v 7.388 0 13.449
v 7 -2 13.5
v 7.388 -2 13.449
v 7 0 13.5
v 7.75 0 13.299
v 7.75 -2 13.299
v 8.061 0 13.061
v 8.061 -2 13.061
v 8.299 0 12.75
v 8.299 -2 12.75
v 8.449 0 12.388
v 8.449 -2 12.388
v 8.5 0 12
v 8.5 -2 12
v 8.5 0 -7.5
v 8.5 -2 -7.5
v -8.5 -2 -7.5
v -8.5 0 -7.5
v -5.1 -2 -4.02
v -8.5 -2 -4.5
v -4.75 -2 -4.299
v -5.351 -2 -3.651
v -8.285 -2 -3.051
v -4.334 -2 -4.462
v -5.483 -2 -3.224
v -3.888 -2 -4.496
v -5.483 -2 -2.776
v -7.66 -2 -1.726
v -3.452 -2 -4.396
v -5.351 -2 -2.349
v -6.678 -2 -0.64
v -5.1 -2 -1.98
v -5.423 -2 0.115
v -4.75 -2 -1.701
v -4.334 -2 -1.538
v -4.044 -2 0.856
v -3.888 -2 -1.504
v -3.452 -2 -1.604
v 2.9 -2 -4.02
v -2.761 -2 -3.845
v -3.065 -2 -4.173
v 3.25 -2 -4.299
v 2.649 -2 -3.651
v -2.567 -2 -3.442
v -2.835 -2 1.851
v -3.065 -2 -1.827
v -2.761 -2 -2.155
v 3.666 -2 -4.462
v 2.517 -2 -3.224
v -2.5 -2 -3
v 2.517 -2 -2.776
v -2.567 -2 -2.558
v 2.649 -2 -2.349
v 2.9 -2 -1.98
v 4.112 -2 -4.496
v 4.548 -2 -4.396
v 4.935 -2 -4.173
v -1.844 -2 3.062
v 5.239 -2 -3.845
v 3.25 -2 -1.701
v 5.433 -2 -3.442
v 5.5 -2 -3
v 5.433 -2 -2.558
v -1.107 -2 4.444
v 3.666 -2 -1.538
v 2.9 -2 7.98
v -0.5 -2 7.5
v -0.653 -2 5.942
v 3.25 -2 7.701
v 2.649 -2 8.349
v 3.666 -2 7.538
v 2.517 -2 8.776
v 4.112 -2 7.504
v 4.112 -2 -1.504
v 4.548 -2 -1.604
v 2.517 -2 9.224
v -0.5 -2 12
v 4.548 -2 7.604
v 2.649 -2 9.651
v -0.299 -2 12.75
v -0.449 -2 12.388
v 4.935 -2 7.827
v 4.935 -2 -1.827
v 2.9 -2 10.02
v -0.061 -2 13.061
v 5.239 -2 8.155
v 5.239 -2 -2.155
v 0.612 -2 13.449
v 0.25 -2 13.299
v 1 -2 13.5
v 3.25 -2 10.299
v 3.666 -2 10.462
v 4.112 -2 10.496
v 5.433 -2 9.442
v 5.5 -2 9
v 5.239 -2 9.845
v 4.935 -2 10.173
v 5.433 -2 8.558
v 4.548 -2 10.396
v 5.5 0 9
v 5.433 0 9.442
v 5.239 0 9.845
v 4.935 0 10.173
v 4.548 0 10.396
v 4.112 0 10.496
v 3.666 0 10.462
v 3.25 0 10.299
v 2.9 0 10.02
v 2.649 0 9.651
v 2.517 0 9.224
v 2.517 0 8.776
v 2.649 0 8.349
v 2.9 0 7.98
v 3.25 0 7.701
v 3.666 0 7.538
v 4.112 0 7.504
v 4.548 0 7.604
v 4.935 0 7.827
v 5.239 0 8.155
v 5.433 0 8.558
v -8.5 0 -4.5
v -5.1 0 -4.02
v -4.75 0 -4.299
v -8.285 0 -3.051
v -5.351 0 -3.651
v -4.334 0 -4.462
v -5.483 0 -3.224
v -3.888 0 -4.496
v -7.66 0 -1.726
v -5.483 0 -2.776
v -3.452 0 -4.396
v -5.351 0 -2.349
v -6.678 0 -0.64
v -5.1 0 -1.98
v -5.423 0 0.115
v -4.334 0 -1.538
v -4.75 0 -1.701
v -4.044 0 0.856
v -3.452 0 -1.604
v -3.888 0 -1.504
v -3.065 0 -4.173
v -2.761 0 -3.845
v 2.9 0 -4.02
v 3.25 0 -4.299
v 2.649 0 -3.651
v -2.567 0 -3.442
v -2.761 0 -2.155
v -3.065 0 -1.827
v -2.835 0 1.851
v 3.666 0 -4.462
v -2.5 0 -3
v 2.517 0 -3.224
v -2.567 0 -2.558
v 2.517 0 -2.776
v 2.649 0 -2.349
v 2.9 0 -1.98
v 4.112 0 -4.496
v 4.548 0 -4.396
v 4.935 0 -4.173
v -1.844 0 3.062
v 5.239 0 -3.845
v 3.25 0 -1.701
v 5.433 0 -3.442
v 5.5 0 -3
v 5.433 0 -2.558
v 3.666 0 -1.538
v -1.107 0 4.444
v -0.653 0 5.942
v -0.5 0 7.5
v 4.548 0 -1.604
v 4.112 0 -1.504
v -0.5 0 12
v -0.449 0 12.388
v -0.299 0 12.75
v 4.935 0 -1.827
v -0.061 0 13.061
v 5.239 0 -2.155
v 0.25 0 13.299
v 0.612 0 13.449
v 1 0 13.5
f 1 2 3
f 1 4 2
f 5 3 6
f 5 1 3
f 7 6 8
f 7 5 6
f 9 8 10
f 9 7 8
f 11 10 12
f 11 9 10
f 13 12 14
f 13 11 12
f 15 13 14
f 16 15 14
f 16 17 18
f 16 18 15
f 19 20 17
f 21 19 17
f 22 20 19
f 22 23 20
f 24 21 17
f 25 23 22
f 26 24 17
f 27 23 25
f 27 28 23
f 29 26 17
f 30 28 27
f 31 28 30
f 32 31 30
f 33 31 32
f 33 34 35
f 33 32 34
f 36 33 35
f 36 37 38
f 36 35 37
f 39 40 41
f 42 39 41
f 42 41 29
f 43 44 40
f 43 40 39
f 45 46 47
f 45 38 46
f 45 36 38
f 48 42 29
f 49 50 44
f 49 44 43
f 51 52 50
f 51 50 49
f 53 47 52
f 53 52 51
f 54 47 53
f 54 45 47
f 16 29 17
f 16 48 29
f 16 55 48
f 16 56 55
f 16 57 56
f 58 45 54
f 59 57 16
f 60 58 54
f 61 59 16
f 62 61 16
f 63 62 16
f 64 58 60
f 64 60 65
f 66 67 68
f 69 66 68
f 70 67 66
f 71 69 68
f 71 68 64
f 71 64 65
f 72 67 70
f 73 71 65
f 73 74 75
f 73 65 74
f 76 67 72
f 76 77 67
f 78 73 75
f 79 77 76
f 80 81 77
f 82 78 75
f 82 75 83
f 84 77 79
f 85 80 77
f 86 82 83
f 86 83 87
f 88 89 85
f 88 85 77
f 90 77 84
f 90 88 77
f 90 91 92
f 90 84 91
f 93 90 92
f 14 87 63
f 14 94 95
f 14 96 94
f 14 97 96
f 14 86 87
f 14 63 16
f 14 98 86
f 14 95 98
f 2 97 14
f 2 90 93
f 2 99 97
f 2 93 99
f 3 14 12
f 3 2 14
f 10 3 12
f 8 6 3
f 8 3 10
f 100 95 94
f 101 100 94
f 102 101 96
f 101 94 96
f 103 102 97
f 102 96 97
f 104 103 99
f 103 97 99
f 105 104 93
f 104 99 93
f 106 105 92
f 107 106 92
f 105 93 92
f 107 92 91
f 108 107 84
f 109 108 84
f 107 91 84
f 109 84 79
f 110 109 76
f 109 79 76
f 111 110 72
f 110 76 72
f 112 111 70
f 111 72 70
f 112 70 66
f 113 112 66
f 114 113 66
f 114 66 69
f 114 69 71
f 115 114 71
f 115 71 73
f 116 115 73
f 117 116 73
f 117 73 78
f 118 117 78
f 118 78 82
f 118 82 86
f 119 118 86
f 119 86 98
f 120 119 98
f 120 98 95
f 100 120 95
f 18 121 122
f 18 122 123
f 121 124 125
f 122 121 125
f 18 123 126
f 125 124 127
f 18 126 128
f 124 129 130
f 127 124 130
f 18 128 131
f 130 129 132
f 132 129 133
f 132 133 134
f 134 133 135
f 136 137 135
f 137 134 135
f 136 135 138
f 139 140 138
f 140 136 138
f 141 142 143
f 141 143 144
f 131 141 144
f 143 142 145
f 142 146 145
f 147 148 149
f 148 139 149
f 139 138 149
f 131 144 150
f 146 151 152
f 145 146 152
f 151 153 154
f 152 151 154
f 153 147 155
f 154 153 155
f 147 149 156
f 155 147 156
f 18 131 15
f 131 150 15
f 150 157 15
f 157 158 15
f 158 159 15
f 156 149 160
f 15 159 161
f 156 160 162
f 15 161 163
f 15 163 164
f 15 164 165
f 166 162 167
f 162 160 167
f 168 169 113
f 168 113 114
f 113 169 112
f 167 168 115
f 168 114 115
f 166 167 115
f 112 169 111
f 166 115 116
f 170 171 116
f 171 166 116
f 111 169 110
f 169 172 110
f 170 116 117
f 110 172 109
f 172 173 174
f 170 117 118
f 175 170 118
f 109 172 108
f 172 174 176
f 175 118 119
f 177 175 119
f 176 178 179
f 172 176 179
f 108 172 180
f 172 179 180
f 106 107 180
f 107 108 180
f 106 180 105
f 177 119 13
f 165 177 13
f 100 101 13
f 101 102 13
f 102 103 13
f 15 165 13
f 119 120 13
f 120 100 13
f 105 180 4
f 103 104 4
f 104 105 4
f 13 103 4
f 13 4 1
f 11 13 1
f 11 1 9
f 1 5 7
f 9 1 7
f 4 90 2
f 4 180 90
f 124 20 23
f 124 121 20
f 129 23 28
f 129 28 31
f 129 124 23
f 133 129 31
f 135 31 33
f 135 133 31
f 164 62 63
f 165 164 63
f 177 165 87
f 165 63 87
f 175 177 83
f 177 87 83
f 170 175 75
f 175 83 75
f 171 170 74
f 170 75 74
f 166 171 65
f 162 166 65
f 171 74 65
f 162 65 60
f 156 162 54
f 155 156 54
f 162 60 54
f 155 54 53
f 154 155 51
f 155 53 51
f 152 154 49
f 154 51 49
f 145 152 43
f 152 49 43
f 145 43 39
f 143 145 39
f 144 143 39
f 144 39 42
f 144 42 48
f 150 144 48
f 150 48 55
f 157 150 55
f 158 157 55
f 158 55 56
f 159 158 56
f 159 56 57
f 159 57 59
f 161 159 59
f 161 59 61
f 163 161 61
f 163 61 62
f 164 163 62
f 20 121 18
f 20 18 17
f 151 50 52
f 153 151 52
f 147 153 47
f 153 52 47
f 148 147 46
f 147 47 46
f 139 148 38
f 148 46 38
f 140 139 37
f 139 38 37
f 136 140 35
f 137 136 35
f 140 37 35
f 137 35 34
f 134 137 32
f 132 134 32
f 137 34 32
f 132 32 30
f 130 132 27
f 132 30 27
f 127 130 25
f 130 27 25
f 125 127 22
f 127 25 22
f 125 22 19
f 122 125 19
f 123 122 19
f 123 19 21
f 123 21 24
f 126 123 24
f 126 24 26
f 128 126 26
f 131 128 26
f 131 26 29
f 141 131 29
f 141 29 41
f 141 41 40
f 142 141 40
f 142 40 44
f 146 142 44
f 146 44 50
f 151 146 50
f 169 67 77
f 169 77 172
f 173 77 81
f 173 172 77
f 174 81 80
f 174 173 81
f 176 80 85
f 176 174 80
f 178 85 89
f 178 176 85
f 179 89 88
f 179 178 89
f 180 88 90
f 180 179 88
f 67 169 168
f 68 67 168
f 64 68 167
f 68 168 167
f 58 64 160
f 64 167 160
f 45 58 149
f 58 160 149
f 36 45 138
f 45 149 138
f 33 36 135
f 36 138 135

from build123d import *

# Parameters (mm, degrees)
F0_W      = 17
F0_H      = 15
F1_DEPTH  = 2
F2_R      = 1.5
F3_DEPTH  = 25
F4_W      = 9
F4_H      = 2
F5_DEPTH  = 6
F6_R      = 1.5
F7_DEPTH  = 25
F8_R      = 1.5
F9_W      = 17
F9_H      = 2
F10_DEPTH = 1
F11_W     = 17
F11_H     = 6
F12_DEPTH = 8
F13_W     = 17
F13_H     = 8
F14_DEPTH = 25
F15_W     = 17
F15_H     = 2
F16_DEPTH = 1
F17_R     = 8
F18_DEPTH = 25
F19_R     = 5


with BuildPart() as f1:
    # F0 (on Front) → F1 (new body)
    with BuildSketch(Plane.XZ):
        Rectangle(F0_W, F0_H)
    extrude(amount=F1_DEPTH)

    # F2 (on face) → F3 (cut)
    with BuildSketch(Plane.XZ.offset(2)):
        with Locations((-4, -3)):
            Circle(F2_R)
        with Locations((4, -3)):
            Circle(F2_R)
    extrude(amount=-F3_DEPTH, mode=Mode.SUBTRACT)

    # F4 (on face) → F5 (join)
    with BuildSketch(Plane.XY.offset(7.5)):
        with Locations((4, -1)):
            Rectangle(F4_W, F4_H)
    extrude(amount=F5_DEPTH)

    # F6 (on face) → F7 (cut)
    with BuildSketch(Plane.XZ.offset(2)):
        with Locations((4, 9)):
            Circle(F6_R)
    extrude(amount=-F7_DEPTH, mode=Mode.SUBTRACT)

    # F8
    f8_edges = [f1.edges().sort_by_distance(p)[0] for p in [
        (8.5, -1, 13.5),
        (-0.5, -1, 13.5),
    ]]
    fillet(f8_edges, radius=F8_R)

    # F9 (on face) → F10 (join)
    with BuildSketch(Plane(origin=(0, 0, -7.5), x_dir=(1, 0, 0), z_dir=(0, 0, -1))):
        with Locations((0, 1)):
            Rectangle(F9_W, F9_H)
    extrude(amount=F10_DEPTH)

    # F11 (on face) → F12 (join)
    with BuildSketch(Plane(origin=(0, 0, -8.5), x_dir=(1, 0, 0), z_dir=(0, 0, -1))):
        with Locations((0, -1)):
            Rectangle(F11_W, F11_H)
    extrude(amount=F12_DEPTH)

    # F13 (on face) → F14 (cut)
    with BuildSketch(Plane(origin=(0, 4, 0), x_dir=(-1, 0, 0), z_dir=(0, 1, 0))):
        with Locations((0, -12.5)):
            Rectangle(F13_W, F13_H)
    extrude(amount=-F14_DEPTH, mode=Mode.SUBTRACT)

    # F15 (on face) → F16 (cut)
    with BuildSketch(Plane(origin=(0, 0, -8.5), x_dir=(1, 0, 0), z_dir=(0, 0, -1))):
        with Locations((0, 1)):
            Rectangle(F15_W, F15_H)
    extrude(amount=-F16_DEPTH, mode=Mode.SUBTRACT)

    # F17 (on face) → F18 (cut)
    with BuildSketch(Plane(origin=(0, 0, 0), x_dir=(-1, 0, 0), z_dir=(0, 1, 0))):
        with Locations((8.5, 7.5)):
            Circle(F17_R)
    extrude(amount=-F18_DEPTH, mode=Mode.SUBTRACT)

    # F19
    f19_edges = [f1.edges().sort_by_distance(p)[0] for p in [
        (-8.5, -1, -0.5),
    ]]
    fillet(f19_edges, radius=F19_R)


solid = f1.part
